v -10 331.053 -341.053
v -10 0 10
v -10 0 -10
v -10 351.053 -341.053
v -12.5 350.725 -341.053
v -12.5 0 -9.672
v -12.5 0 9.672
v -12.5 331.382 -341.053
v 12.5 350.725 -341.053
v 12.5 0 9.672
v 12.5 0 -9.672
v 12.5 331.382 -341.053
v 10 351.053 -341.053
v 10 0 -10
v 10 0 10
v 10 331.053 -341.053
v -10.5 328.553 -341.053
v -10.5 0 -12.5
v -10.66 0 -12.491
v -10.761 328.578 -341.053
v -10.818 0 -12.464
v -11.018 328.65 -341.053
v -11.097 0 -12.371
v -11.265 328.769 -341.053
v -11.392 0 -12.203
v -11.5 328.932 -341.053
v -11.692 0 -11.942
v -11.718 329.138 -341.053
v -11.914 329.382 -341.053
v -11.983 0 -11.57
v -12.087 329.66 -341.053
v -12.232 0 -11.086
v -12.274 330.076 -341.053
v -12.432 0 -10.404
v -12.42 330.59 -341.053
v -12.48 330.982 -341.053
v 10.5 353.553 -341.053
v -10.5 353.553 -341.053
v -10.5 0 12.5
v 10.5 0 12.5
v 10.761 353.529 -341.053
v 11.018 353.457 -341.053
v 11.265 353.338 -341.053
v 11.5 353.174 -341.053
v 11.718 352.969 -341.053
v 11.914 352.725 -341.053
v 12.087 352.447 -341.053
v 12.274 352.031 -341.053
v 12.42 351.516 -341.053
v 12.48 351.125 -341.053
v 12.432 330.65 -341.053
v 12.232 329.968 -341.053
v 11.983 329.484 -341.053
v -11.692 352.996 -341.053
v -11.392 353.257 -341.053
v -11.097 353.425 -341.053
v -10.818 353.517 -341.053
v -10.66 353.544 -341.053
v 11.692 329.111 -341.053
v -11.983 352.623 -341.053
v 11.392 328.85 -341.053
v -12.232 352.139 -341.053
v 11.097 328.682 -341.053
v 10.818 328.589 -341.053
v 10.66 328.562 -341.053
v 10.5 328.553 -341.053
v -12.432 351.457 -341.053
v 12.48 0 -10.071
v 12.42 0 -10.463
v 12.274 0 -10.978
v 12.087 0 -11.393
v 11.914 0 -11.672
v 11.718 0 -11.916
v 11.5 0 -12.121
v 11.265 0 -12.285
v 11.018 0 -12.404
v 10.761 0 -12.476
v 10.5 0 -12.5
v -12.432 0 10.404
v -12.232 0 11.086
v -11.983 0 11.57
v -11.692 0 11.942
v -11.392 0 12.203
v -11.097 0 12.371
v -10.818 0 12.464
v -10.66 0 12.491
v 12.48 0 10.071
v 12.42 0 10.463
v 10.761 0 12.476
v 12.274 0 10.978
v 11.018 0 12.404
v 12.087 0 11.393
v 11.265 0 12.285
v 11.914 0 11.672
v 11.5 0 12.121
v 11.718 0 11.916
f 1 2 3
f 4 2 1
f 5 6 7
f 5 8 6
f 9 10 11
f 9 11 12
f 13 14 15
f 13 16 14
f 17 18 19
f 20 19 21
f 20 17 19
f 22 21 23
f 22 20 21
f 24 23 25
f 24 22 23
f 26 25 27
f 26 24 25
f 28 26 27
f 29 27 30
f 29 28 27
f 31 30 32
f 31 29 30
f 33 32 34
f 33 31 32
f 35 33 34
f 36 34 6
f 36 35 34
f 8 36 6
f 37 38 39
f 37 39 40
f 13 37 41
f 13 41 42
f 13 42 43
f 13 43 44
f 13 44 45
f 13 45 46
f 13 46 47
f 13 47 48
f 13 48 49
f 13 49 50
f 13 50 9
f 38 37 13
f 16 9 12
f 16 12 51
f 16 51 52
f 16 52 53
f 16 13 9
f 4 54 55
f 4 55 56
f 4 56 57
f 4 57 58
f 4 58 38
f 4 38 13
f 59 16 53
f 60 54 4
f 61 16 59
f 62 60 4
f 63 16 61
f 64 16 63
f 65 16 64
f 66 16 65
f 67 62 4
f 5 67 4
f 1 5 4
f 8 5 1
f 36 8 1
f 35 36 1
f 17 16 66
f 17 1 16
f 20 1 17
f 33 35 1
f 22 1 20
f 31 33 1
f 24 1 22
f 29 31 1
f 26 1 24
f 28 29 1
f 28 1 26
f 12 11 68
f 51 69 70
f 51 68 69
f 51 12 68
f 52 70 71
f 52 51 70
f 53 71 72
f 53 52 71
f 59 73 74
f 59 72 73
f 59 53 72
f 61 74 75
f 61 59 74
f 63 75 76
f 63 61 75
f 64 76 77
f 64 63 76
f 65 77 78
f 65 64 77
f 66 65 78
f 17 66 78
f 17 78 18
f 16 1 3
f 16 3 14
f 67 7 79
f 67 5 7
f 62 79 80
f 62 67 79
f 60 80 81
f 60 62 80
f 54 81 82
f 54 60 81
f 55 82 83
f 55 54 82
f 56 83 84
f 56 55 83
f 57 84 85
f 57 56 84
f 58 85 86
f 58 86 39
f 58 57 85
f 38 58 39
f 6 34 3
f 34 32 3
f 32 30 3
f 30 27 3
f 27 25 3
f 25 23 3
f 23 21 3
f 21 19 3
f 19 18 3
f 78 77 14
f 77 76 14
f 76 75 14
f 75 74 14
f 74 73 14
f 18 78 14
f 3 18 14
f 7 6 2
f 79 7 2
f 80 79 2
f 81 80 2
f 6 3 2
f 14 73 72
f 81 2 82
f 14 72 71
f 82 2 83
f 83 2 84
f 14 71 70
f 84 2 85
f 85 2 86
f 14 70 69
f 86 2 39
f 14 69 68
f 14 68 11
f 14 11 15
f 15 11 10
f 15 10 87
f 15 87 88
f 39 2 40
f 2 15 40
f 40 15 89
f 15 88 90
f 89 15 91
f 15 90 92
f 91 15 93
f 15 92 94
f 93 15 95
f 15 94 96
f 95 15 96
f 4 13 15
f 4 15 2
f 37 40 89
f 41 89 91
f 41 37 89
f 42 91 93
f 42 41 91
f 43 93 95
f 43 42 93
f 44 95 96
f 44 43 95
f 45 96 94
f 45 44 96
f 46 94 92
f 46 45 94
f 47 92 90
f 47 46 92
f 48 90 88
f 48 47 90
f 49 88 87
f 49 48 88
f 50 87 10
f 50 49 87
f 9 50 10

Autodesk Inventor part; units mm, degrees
ref_plane "YZ Plane" through (0, 0, 0) normal (1, 0, 0) x (0, 1, 0)
ref_plane "XZ Plane" through (0, 0, 0) normal (0, 1, 0) x (-1, 0, 0)
sketch "profile" plane through (0, 0, 0) normal (0, 1, 0) x (-1, 0, 0)
  line L0 (12.5, 12.5) -> (-12.5, 12.5)
  line L1 (-12.5, 12.5) -> (-12.5, -12.5)
  line L2 (-12.5, -12.5) -> (12.5, -12.5)
  line L3 (12.5, -12.5) -> (12.5, 12.5)
  line L4 (-10, -10) -> (-10, 10)
  line L5 (-10, 10) -> (10, 10)
  line L6 (10, 10) -> (10, -10)
  line L7 (10, -10) -> (-10, -10)
  point P0 (0, 0)
  dimension "d0" = 12.5
  dimension "d1" = 25
  dimension "d2" = 25
  dimension "d3" = 12.5
  dimension "d6" = 2.5
sketch3d "3D Sketch1"
  line L0 (0, 0, 0) -> (0, 353.5534, -353.5534)
  dimension "d4" = 500
  dimension "d5" = 45
sweep "Sweep1" add profiles "profile" path "3D Sketch1"
fillet "Fillet1" radius 2 4 edges at (-12.5, 176.7767, -189.2767) (-12.5, 176.7767, -164.2767) (12.5, 176.7767, -164.2767) (12.5, 176.7767, -189.2767)
ref_plane "mirrored45" through (-12.5, 353.5534, -341.0534) normal (0, 0, 1) x (1, 0, 0)
split "Split1" plane through (-12.5, 353.5534, -341.0534) removes the side toward (0, 0, -1)
equation "\"d0\" = 0.5 * d1"
equation "\"d1\" = width"
equation "\"d2\" = d1"
equation "\"d3\" = 0.5 * d2"
equation "\"d6\" = t"
equation "\"d4\" = L"
equation "\"d5\" = angleCut"
equation "\"d9\" = filletRadius"
equation "\"t\" = 2.5"
equation "\"filletRadius\" = 2"
equation "\"angleCut\" = 45deg"
equation "\"width\" = 25"
equation "\"a\" = 45"
equation "\"L\" = 500"
properties part number "support_truss" material "Steel, Galvanized"
